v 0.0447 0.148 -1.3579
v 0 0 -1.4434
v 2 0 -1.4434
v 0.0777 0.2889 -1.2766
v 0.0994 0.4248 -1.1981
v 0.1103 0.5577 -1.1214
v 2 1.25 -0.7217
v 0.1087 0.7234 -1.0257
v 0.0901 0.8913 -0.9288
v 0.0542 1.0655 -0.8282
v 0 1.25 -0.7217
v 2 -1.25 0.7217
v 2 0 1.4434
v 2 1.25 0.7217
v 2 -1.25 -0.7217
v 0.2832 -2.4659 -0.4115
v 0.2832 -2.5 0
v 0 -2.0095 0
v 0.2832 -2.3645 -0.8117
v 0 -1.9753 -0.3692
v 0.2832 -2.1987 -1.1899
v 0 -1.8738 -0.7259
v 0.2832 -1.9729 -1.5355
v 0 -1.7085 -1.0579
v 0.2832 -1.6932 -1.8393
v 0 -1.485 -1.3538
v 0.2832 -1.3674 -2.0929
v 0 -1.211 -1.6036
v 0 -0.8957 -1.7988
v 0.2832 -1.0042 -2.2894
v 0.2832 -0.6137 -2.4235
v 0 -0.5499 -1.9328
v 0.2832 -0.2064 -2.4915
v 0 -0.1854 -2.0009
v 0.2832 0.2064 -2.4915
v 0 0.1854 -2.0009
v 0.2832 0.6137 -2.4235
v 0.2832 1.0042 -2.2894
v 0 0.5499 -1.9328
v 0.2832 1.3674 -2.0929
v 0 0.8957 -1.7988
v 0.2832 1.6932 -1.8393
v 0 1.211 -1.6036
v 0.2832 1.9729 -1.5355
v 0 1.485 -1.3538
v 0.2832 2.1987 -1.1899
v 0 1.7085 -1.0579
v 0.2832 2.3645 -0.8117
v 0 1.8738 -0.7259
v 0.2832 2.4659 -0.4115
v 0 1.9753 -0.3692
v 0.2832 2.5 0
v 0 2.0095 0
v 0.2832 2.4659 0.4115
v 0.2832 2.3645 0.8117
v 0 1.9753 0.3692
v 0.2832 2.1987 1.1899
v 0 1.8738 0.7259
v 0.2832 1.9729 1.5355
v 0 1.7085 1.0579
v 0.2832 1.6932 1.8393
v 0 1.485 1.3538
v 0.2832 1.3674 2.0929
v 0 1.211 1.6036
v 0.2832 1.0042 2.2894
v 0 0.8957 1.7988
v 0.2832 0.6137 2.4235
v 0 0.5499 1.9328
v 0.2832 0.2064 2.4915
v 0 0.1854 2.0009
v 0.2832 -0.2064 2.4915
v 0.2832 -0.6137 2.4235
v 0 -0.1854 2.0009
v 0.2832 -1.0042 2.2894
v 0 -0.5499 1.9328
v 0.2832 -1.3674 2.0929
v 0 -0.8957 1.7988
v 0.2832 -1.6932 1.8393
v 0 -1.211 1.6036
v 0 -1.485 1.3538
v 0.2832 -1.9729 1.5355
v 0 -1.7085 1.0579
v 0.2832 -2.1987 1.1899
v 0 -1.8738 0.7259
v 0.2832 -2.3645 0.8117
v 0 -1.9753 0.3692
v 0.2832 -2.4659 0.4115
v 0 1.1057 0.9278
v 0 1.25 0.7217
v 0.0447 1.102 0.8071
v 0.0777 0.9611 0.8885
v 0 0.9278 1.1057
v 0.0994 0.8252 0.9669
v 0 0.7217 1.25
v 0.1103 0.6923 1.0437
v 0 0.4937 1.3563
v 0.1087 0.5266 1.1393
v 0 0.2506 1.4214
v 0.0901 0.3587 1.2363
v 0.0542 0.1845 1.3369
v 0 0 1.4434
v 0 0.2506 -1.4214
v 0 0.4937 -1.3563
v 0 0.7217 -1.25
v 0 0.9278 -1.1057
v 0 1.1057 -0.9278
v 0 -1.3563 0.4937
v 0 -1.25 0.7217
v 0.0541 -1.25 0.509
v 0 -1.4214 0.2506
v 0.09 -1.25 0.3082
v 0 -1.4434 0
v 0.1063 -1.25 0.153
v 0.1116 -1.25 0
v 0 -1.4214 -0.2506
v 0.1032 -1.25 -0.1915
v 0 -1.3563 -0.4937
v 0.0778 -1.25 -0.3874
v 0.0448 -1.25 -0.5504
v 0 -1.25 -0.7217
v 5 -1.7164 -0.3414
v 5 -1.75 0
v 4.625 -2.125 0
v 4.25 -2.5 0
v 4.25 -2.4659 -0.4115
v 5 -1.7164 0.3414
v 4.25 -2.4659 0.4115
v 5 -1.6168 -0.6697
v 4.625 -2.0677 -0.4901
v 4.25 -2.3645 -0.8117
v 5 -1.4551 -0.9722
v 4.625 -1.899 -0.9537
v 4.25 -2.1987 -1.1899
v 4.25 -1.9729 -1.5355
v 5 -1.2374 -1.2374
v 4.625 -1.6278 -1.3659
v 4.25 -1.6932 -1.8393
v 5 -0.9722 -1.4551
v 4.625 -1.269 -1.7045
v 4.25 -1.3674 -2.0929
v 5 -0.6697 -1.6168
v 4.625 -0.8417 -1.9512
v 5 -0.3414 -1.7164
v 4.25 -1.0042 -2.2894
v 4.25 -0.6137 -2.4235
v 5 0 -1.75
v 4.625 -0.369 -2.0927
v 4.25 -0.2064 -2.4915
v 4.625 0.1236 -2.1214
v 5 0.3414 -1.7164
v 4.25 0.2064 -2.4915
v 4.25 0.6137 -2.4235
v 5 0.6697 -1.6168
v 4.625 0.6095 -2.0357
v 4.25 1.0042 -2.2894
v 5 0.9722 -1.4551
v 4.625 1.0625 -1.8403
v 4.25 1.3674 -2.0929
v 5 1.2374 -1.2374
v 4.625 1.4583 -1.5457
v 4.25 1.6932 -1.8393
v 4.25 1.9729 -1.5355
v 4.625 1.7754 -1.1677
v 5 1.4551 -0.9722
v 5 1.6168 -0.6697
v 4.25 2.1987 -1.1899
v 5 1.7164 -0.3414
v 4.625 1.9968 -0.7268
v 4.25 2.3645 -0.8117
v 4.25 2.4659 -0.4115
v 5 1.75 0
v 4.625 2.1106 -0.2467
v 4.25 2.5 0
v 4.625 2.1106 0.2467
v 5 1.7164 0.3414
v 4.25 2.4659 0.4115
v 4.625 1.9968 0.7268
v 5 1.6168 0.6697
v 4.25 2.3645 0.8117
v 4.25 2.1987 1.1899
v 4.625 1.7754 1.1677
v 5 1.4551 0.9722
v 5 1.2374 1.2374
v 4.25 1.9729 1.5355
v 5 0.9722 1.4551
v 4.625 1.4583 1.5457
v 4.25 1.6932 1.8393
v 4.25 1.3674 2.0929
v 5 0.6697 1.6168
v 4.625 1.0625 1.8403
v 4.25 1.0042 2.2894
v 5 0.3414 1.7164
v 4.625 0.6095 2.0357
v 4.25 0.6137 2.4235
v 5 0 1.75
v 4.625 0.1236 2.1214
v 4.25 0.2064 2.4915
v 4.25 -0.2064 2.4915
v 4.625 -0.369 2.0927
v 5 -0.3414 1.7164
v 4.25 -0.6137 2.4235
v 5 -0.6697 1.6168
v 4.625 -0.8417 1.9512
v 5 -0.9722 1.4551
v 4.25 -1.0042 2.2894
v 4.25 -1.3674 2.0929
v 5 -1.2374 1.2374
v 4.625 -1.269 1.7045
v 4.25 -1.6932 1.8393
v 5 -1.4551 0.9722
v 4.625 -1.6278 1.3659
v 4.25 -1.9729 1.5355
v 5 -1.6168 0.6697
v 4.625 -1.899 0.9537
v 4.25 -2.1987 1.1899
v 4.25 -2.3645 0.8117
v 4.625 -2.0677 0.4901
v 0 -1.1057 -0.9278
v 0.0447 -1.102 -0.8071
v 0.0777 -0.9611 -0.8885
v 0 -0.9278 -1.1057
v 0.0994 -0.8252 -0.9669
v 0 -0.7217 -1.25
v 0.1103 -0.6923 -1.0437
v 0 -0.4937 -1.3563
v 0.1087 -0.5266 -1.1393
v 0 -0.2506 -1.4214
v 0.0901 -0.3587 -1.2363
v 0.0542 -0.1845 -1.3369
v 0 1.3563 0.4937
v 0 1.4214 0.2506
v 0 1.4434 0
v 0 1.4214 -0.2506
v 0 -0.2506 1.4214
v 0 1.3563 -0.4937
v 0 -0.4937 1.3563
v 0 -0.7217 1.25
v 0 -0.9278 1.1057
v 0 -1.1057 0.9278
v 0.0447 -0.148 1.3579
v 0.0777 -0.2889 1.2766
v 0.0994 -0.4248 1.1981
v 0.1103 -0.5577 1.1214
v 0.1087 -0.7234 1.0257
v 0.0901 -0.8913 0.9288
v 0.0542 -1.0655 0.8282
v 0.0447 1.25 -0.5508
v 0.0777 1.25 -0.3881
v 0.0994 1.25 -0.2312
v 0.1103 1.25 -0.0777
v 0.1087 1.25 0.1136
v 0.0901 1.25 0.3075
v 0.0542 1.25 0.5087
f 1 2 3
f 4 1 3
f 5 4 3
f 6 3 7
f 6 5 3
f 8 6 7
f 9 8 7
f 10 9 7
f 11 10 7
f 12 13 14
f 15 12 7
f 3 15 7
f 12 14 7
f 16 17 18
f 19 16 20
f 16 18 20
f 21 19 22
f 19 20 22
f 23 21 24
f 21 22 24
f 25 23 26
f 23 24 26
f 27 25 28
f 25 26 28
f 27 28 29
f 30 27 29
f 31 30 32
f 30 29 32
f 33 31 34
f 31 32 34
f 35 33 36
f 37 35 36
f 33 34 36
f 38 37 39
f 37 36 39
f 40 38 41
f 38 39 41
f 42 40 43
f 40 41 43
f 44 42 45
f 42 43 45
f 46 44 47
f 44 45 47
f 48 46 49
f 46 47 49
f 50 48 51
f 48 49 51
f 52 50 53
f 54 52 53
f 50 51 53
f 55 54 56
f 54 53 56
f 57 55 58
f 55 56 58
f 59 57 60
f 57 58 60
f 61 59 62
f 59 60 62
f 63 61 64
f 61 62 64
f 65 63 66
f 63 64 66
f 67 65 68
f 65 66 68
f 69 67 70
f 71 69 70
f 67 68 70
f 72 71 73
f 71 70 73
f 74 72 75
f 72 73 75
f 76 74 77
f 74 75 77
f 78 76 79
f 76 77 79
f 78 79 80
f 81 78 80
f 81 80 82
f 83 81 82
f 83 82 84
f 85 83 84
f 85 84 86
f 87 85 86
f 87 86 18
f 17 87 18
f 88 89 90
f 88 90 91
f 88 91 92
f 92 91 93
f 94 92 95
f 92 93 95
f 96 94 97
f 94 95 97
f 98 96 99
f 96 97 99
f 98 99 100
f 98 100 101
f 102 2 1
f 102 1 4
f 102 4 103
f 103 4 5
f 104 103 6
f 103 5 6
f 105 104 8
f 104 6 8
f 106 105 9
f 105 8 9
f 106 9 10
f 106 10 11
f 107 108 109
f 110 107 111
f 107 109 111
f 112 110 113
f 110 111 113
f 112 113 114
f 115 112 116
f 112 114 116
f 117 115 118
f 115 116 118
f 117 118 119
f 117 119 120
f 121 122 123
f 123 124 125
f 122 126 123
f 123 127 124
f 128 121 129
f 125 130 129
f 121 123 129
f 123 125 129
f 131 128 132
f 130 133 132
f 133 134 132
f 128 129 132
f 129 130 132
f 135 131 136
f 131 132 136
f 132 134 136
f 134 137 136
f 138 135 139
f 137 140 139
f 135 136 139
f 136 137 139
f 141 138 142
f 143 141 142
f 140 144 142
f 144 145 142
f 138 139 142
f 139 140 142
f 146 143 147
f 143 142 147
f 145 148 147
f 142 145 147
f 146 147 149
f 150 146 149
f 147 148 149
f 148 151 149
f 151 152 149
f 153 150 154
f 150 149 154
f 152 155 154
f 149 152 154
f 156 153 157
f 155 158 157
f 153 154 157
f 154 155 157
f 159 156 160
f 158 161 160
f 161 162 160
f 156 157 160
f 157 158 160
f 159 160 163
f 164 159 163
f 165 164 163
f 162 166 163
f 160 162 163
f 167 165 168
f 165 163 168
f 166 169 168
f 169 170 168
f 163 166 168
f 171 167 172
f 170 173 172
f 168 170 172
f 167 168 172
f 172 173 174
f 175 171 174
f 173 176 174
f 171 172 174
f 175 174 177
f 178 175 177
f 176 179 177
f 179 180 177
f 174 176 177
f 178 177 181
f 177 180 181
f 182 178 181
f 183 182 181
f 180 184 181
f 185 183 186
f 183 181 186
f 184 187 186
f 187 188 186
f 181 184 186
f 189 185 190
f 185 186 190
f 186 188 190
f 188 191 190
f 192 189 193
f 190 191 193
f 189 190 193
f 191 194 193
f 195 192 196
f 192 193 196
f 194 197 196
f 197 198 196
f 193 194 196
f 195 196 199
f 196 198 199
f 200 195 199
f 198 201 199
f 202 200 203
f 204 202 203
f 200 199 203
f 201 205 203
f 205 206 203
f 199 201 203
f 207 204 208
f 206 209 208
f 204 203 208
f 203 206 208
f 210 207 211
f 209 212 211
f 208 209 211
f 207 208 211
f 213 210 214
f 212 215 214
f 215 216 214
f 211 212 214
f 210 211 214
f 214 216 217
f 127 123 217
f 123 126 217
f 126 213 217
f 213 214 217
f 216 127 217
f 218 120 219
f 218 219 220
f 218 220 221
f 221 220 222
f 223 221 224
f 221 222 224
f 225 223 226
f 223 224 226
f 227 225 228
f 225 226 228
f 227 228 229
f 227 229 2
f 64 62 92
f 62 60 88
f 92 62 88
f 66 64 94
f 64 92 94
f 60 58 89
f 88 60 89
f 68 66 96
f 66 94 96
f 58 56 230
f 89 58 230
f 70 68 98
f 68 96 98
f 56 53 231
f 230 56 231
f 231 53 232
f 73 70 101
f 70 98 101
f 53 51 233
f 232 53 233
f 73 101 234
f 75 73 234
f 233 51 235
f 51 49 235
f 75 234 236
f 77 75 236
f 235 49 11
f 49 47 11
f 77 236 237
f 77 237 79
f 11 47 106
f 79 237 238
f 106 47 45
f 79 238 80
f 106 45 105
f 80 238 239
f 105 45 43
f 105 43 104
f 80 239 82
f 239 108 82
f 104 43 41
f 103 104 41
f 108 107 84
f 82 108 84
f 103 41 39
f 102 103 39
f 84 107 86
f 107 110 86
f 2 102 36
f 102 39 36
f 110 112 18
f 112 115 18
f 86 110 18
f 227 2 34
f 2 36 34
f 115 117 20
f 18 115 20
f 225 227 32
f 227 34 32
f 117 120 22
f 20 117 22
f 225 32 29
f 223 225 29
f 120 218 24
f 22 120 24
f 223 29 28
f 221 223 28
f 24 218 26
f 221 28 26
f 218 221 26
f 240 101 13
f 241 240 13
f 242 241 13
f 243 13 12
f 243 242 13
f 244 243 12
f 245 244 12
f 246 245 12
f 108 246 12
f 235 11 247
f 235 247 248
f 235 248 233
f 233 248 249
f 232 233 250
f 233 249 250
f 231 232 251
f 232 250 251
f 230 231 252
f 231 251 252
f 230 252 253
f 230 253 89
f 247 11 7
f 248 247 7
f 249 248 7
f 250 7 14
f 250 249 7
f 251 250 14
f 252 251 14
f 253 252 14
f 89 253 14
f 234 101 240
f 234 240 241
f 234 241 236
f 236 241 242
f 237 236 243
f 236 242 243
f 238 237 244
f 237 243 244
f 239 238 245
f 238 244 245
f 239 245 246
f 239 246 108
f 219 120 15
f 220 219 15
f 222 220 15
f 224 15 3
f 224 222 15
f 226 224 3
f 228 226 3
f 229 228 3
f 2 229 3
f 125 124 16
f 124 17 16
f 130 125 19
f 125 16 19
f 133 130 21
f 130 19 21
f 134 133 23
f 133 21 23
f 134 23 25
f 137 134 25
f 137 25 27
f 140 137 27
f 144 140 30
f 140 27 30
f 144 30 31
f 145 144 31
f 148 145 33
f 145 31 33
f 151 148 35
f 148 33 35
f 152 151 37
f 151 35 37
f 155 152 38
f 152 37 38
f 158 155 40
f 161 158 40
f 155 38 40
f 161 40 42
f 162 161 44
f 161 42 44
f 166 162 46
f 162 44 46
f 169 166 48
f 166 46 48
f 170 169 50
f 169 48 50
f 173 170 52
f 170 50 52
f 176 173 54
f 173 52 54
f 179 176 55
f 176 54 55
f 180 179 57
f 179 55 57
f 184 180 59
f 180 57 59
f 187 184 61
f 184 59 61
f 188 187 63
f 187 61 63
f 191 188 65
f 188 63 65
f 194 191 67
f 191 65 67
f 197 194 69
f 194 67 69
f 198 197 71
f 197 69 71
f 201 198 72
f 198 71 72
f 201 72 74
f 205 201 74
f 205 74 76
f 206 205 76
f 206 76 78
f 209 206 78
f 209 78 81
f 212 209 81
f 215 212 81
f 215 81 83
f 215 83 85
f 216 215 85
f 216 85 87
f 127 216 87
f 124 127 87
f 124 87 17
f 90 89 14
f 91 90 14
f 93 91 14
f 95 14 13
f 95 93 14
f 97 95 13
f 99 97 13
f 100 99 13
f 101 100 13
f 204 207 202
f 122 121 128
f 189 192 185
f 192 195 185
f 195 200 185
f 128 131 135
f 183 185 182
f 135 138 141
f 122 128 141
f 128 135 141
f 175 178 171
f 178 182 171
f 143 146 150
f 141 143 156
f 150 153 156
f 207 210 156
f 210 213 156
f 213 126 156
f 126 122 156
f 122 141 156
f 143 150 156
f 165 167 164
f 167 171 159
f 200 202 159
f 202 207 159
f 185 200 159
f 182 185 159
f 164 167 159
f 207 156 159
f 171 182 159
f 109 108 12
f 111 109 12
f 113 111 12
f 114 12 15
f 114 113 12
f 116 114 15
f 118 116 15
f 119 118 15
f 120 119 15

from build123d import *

# Parameters (mm, degrees)
CUT_EXTRUDE1_DEPTH = 2


with BuildPart() as part:
    # Sketch1 → Revolve1 (revolve)
    with BuildSketch(Plane.XY):
        Polygon((5, 0), (5, -1.75), (4.25, -2.5), (0.283190307, -2.5), (0, -2.0095), (0, -1.443375673), (0.833333333, 0), align=None)
    revolve(axis=Axis((0.833333333, 0, 0), (1, 0, 0)))

    # Sketch2 → Cut-Extrude1 (cut)
    with BuildSketch(Plane(origin=(0, 0, 0), x_dir=(0, 0, -1), z_dir=(1, 0, 0))):
        Polygon((-1.443375673, 0), (-0.721687836, -1.25), (0.721687836, -1.25), (1.443375673, 0), (0.721687836, 1.25), (-0.721687836, 1.25), align=None)
    extrude(amount=CUT_EXTRUDE1_DEPTH, mode=Mode.SUBTRACT)


solid = part.part
